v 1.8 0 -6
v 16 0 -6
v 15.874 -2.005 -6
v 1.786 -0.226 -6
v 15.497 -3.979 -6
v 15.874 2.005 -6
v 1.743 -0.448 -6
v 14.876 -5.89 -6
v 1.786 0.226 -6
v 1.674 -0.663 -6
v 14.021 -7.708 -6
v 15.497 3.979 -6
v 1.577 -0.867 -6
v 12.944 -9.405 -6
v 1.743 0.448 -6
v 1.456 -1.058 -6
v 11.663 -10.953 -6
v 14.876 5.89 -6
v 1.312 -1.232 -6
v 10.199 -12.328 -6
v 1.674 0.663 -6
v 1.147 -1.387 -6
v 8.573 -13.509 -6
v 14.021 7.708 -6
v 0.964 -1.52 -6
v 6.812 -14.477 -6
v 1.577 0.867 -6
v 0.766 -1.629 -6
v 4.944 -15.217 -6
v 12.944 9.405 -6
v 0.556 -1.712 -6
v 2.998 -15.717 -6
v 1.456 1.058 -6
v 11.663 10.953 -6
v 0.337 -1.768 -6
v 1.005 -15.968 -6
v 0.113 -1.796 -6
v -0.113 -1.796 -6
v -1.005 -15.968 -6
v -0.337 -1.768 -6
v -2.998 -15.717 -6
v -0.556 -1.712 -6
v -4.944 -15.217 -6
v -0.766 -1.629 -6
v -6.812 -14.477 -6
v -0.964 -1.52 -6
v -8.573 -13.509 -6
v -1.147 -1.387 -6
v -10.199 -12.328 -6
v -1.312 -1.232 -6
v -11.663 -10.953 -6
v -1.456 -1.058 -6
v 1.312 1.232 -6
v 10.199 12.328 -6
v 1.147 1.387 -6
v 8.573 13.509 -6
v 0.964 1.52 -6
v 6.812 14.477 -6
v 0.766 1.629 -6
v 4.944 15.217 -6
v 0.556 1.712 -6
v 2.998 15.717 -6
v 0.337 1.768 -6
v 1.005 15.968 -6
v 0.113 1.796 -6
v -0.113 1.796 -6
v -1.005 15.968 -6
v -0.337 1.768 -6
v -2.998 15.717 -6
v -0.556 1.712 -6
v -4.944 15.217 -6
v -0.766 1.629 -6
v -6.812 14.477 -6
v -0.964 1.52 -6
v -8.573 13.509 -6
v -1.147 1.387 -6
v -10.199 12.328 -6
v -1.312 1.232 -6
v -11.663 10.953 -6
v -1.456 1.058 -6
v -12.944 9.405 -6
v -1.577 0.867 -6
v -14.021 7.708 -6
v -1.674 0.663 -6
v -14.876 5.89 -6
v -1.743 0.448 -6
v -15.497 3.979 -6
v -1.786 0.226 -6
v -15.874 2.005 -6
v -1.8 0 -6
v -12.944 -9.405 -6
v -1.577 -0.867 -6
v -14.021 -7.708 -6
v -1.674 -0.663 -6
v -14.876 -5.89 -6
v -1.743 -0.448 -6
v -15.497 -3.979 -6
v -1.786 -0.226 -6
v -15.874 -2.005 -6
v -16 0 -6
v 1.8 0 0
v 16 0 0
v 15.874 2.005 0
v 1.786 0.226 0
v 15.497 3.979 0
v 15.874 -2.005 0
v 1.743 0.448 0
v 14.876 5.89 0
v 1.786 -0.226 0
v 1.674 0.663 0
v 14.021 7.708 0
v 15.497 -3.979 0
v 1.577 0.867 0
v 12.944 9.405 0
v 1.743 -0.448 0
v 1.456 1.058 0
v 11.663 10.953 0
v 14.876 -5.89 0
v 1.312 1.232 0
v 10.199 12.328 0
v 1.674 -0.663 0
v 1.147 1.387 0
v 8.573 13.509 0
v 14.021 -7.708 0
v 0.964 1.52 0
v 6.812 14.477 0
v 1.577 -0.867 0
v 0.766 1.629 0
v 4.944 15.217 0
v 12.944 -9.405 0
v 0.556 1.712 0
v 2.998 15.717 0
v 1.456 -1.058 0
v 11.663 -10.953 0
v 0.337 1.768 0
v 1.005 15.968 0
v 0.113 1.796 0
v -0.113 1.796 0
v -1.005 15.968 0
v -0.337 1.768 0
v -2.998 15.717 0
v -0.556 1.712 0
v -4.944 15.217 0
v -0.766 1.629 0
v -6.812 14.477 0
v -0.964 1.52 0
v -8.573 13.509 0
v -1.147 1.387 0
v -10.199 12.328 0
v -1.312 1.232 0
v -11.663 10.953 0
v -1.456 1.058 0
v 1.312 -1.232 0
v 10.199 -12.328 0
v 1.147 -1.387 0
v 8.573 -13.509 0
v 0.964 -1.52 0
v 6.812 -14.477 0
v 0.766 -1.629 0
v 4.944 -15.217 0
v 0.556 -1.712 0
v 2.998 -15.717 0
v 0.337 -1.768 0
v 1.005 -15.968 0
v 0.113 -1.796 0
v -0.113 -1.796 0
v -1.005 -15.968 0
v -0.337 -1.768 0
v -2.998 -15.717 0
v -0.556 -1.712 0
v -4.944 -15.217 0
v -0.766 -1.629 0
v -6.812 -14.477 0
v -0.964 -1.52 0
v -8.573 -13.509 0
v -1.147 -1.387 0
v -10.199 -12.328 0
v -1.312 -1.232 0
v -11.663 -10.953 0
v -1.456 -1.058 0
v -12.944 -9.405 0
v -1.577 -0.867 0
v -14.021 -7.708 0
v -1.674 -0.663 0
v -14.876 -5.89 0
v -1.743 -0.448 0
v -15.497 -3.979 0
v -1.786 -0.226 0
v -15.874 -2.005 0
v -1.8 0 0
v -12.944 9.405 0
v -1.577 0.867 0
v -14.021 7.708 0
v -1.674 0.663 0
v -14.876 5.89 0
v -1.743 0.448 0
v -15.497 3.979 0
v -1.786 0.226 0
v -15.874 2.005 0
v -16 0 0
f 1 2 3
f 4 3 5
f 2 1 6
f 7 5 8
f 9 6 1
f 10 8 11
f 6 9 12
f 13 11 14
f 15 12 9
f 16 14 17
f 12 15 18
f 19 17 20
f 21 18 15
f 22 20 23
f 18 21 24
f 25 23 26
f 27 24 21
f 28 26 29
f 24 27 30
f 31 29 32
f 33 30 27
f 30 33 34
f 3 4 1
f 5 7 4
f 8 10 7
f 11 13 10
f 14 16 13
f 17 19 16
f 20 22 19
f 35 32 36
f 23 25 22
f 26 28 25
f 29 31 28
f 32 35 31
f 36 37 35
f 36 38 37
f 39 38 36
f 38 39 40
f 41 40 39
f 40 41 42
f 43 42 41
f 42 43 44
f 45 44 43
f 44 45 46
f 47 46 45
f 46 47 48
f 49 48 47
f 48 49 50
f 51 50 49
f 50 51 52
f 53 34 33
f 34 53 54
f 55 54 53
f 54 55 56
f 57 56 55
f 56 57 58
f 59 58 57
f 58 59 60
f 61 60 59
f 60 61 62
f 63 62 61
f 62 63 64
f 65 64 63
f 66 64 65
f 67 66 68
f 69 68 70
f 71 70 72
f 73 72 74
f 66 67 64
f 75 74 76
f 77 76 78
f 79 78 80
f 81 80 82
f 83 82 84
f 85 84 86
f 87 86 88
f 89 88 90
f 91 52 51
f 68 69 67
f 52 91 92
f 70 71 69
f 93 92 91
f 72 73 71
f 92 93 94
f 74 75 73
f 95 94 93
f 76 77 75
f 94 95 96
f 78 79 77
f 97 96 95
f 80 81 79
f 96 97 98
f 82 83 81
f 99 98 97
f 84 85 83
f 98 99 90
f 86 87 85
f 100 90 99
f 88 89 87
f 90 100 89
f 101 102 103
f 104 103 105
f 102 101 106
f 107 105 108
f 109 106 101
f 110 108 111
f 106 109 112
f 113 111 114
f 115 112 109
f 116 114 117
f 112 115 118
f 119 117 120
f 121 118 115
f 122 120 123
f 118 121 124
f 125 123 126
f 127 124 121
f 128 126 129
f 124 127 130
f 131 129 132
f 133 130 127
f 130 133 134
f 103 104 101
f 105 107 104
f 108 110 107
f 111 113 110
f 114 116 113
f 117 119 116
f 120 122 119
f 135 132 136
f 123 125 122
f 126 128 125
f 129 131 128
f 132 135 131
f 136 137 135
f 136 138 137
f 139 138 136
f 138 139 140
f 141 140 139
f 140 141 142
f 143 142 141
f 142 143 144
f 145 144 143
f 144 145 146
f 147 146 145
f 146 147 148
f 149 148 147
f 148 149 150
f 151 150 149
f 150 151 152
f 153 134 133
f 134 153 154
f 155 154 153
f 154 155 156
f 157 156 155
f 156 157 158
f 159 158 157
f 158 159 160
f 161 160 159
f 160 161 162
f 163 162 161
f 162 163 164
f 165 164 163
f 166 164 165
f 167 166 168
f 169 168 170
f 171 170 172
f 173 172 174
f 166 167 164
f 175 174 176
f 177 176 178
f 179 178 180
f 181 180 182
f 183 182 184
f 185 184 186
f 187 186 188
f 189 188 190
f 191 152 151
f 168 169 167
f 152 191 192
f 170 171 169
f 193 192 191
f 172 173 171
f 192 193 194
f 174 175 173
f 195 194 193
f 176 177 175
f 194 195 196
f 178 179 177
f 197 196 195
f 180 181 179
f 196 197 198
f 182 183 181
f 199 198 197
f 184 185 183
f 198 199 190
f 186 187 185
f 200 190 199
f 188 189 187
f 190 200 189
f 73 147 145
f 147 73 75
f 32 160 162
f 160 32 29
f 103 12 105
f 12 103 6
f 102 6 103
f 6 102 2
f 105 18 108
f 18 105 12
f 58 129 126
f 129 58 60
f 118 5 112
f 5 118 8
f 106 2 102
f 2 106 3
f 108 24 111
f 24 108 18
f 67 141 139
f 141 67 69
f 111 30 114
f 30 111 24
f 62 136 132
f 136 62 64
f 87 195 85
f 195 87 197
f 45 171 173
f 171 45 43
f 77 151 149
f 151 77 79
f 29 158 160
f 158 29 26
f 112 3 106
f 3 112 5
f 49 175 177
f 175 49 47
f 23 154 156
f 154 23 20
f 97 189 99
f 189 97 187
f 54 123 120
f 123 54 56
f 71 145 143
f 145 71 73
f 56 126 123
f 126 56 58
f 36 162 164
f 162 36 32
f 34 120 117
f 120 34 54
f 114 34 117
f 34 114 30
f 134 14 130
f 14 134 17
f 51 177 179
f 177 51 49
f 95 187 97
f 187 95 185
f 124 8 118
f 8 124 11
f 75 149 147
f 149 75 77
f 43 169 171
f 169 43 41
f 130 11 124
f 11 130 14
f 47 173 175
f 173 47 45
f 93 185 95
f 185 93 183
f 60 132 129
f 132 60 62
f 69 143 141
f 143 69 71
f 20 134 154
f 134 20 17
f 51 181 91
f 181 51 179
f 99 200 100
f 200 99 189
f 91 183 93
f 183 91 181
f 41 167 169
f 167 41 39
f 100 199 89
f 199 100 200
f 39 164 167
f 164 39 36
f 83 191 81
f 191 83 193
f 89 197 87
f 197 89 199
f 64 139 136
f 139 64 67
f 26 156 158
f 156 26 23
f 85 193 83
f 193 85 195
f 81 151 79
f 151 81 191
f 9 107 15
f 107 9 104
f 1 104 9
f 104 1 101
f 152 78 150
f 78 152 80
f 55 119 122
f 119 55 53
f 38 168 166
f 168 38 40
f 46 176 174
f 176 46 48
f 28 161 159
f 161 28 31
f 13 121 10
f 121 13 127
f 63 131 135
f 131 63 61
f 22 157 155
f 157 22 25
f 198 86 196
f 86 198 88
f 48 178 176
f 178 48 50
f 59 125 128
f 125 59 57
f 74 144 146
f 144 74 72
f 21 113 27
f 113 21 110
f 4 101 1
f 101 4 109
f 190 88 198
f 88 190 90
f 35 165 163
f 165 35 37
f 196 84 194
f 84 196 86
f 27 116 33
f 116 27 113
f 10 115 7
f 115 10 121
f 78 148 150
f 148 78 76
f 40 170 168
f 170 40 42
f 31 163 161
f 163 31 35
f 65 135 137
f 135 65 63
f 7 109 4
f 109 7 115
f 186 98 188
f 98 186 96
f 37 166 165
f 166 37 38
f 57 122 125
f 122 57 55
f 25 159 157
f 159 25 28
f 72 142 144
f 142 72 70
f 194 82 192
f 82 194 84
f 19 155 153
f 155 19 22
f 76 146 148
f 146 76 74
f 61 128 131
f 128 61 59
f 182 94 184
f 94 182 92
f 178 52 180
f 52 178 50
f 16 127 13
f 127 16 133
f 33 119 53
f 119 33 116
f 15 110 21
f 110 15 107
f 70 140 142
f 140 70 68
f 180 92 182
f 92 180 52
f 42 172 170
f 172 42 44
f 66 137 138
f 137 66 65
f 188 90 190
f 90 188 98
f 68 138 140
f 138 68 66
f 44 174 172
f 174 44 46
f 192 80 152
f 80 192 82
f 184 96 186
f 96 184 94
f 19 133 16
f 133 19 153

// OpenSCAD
$fn = 50;


difference() {
	union() {
		translate(v = [0, 0, -6.0000000000]) {
			cylinder(h = 6, r = 7.0000000000);
		}
		translate(v = [0, 0, -6.0000000000]) {
			cylinder(h = 6, r = 16.0000000000);
		}
	}
	union() {
		#translate(v = [0, 0, -6]) {
			cylinder(h = 6, r = 1.8000000000);
		}
	}
}
